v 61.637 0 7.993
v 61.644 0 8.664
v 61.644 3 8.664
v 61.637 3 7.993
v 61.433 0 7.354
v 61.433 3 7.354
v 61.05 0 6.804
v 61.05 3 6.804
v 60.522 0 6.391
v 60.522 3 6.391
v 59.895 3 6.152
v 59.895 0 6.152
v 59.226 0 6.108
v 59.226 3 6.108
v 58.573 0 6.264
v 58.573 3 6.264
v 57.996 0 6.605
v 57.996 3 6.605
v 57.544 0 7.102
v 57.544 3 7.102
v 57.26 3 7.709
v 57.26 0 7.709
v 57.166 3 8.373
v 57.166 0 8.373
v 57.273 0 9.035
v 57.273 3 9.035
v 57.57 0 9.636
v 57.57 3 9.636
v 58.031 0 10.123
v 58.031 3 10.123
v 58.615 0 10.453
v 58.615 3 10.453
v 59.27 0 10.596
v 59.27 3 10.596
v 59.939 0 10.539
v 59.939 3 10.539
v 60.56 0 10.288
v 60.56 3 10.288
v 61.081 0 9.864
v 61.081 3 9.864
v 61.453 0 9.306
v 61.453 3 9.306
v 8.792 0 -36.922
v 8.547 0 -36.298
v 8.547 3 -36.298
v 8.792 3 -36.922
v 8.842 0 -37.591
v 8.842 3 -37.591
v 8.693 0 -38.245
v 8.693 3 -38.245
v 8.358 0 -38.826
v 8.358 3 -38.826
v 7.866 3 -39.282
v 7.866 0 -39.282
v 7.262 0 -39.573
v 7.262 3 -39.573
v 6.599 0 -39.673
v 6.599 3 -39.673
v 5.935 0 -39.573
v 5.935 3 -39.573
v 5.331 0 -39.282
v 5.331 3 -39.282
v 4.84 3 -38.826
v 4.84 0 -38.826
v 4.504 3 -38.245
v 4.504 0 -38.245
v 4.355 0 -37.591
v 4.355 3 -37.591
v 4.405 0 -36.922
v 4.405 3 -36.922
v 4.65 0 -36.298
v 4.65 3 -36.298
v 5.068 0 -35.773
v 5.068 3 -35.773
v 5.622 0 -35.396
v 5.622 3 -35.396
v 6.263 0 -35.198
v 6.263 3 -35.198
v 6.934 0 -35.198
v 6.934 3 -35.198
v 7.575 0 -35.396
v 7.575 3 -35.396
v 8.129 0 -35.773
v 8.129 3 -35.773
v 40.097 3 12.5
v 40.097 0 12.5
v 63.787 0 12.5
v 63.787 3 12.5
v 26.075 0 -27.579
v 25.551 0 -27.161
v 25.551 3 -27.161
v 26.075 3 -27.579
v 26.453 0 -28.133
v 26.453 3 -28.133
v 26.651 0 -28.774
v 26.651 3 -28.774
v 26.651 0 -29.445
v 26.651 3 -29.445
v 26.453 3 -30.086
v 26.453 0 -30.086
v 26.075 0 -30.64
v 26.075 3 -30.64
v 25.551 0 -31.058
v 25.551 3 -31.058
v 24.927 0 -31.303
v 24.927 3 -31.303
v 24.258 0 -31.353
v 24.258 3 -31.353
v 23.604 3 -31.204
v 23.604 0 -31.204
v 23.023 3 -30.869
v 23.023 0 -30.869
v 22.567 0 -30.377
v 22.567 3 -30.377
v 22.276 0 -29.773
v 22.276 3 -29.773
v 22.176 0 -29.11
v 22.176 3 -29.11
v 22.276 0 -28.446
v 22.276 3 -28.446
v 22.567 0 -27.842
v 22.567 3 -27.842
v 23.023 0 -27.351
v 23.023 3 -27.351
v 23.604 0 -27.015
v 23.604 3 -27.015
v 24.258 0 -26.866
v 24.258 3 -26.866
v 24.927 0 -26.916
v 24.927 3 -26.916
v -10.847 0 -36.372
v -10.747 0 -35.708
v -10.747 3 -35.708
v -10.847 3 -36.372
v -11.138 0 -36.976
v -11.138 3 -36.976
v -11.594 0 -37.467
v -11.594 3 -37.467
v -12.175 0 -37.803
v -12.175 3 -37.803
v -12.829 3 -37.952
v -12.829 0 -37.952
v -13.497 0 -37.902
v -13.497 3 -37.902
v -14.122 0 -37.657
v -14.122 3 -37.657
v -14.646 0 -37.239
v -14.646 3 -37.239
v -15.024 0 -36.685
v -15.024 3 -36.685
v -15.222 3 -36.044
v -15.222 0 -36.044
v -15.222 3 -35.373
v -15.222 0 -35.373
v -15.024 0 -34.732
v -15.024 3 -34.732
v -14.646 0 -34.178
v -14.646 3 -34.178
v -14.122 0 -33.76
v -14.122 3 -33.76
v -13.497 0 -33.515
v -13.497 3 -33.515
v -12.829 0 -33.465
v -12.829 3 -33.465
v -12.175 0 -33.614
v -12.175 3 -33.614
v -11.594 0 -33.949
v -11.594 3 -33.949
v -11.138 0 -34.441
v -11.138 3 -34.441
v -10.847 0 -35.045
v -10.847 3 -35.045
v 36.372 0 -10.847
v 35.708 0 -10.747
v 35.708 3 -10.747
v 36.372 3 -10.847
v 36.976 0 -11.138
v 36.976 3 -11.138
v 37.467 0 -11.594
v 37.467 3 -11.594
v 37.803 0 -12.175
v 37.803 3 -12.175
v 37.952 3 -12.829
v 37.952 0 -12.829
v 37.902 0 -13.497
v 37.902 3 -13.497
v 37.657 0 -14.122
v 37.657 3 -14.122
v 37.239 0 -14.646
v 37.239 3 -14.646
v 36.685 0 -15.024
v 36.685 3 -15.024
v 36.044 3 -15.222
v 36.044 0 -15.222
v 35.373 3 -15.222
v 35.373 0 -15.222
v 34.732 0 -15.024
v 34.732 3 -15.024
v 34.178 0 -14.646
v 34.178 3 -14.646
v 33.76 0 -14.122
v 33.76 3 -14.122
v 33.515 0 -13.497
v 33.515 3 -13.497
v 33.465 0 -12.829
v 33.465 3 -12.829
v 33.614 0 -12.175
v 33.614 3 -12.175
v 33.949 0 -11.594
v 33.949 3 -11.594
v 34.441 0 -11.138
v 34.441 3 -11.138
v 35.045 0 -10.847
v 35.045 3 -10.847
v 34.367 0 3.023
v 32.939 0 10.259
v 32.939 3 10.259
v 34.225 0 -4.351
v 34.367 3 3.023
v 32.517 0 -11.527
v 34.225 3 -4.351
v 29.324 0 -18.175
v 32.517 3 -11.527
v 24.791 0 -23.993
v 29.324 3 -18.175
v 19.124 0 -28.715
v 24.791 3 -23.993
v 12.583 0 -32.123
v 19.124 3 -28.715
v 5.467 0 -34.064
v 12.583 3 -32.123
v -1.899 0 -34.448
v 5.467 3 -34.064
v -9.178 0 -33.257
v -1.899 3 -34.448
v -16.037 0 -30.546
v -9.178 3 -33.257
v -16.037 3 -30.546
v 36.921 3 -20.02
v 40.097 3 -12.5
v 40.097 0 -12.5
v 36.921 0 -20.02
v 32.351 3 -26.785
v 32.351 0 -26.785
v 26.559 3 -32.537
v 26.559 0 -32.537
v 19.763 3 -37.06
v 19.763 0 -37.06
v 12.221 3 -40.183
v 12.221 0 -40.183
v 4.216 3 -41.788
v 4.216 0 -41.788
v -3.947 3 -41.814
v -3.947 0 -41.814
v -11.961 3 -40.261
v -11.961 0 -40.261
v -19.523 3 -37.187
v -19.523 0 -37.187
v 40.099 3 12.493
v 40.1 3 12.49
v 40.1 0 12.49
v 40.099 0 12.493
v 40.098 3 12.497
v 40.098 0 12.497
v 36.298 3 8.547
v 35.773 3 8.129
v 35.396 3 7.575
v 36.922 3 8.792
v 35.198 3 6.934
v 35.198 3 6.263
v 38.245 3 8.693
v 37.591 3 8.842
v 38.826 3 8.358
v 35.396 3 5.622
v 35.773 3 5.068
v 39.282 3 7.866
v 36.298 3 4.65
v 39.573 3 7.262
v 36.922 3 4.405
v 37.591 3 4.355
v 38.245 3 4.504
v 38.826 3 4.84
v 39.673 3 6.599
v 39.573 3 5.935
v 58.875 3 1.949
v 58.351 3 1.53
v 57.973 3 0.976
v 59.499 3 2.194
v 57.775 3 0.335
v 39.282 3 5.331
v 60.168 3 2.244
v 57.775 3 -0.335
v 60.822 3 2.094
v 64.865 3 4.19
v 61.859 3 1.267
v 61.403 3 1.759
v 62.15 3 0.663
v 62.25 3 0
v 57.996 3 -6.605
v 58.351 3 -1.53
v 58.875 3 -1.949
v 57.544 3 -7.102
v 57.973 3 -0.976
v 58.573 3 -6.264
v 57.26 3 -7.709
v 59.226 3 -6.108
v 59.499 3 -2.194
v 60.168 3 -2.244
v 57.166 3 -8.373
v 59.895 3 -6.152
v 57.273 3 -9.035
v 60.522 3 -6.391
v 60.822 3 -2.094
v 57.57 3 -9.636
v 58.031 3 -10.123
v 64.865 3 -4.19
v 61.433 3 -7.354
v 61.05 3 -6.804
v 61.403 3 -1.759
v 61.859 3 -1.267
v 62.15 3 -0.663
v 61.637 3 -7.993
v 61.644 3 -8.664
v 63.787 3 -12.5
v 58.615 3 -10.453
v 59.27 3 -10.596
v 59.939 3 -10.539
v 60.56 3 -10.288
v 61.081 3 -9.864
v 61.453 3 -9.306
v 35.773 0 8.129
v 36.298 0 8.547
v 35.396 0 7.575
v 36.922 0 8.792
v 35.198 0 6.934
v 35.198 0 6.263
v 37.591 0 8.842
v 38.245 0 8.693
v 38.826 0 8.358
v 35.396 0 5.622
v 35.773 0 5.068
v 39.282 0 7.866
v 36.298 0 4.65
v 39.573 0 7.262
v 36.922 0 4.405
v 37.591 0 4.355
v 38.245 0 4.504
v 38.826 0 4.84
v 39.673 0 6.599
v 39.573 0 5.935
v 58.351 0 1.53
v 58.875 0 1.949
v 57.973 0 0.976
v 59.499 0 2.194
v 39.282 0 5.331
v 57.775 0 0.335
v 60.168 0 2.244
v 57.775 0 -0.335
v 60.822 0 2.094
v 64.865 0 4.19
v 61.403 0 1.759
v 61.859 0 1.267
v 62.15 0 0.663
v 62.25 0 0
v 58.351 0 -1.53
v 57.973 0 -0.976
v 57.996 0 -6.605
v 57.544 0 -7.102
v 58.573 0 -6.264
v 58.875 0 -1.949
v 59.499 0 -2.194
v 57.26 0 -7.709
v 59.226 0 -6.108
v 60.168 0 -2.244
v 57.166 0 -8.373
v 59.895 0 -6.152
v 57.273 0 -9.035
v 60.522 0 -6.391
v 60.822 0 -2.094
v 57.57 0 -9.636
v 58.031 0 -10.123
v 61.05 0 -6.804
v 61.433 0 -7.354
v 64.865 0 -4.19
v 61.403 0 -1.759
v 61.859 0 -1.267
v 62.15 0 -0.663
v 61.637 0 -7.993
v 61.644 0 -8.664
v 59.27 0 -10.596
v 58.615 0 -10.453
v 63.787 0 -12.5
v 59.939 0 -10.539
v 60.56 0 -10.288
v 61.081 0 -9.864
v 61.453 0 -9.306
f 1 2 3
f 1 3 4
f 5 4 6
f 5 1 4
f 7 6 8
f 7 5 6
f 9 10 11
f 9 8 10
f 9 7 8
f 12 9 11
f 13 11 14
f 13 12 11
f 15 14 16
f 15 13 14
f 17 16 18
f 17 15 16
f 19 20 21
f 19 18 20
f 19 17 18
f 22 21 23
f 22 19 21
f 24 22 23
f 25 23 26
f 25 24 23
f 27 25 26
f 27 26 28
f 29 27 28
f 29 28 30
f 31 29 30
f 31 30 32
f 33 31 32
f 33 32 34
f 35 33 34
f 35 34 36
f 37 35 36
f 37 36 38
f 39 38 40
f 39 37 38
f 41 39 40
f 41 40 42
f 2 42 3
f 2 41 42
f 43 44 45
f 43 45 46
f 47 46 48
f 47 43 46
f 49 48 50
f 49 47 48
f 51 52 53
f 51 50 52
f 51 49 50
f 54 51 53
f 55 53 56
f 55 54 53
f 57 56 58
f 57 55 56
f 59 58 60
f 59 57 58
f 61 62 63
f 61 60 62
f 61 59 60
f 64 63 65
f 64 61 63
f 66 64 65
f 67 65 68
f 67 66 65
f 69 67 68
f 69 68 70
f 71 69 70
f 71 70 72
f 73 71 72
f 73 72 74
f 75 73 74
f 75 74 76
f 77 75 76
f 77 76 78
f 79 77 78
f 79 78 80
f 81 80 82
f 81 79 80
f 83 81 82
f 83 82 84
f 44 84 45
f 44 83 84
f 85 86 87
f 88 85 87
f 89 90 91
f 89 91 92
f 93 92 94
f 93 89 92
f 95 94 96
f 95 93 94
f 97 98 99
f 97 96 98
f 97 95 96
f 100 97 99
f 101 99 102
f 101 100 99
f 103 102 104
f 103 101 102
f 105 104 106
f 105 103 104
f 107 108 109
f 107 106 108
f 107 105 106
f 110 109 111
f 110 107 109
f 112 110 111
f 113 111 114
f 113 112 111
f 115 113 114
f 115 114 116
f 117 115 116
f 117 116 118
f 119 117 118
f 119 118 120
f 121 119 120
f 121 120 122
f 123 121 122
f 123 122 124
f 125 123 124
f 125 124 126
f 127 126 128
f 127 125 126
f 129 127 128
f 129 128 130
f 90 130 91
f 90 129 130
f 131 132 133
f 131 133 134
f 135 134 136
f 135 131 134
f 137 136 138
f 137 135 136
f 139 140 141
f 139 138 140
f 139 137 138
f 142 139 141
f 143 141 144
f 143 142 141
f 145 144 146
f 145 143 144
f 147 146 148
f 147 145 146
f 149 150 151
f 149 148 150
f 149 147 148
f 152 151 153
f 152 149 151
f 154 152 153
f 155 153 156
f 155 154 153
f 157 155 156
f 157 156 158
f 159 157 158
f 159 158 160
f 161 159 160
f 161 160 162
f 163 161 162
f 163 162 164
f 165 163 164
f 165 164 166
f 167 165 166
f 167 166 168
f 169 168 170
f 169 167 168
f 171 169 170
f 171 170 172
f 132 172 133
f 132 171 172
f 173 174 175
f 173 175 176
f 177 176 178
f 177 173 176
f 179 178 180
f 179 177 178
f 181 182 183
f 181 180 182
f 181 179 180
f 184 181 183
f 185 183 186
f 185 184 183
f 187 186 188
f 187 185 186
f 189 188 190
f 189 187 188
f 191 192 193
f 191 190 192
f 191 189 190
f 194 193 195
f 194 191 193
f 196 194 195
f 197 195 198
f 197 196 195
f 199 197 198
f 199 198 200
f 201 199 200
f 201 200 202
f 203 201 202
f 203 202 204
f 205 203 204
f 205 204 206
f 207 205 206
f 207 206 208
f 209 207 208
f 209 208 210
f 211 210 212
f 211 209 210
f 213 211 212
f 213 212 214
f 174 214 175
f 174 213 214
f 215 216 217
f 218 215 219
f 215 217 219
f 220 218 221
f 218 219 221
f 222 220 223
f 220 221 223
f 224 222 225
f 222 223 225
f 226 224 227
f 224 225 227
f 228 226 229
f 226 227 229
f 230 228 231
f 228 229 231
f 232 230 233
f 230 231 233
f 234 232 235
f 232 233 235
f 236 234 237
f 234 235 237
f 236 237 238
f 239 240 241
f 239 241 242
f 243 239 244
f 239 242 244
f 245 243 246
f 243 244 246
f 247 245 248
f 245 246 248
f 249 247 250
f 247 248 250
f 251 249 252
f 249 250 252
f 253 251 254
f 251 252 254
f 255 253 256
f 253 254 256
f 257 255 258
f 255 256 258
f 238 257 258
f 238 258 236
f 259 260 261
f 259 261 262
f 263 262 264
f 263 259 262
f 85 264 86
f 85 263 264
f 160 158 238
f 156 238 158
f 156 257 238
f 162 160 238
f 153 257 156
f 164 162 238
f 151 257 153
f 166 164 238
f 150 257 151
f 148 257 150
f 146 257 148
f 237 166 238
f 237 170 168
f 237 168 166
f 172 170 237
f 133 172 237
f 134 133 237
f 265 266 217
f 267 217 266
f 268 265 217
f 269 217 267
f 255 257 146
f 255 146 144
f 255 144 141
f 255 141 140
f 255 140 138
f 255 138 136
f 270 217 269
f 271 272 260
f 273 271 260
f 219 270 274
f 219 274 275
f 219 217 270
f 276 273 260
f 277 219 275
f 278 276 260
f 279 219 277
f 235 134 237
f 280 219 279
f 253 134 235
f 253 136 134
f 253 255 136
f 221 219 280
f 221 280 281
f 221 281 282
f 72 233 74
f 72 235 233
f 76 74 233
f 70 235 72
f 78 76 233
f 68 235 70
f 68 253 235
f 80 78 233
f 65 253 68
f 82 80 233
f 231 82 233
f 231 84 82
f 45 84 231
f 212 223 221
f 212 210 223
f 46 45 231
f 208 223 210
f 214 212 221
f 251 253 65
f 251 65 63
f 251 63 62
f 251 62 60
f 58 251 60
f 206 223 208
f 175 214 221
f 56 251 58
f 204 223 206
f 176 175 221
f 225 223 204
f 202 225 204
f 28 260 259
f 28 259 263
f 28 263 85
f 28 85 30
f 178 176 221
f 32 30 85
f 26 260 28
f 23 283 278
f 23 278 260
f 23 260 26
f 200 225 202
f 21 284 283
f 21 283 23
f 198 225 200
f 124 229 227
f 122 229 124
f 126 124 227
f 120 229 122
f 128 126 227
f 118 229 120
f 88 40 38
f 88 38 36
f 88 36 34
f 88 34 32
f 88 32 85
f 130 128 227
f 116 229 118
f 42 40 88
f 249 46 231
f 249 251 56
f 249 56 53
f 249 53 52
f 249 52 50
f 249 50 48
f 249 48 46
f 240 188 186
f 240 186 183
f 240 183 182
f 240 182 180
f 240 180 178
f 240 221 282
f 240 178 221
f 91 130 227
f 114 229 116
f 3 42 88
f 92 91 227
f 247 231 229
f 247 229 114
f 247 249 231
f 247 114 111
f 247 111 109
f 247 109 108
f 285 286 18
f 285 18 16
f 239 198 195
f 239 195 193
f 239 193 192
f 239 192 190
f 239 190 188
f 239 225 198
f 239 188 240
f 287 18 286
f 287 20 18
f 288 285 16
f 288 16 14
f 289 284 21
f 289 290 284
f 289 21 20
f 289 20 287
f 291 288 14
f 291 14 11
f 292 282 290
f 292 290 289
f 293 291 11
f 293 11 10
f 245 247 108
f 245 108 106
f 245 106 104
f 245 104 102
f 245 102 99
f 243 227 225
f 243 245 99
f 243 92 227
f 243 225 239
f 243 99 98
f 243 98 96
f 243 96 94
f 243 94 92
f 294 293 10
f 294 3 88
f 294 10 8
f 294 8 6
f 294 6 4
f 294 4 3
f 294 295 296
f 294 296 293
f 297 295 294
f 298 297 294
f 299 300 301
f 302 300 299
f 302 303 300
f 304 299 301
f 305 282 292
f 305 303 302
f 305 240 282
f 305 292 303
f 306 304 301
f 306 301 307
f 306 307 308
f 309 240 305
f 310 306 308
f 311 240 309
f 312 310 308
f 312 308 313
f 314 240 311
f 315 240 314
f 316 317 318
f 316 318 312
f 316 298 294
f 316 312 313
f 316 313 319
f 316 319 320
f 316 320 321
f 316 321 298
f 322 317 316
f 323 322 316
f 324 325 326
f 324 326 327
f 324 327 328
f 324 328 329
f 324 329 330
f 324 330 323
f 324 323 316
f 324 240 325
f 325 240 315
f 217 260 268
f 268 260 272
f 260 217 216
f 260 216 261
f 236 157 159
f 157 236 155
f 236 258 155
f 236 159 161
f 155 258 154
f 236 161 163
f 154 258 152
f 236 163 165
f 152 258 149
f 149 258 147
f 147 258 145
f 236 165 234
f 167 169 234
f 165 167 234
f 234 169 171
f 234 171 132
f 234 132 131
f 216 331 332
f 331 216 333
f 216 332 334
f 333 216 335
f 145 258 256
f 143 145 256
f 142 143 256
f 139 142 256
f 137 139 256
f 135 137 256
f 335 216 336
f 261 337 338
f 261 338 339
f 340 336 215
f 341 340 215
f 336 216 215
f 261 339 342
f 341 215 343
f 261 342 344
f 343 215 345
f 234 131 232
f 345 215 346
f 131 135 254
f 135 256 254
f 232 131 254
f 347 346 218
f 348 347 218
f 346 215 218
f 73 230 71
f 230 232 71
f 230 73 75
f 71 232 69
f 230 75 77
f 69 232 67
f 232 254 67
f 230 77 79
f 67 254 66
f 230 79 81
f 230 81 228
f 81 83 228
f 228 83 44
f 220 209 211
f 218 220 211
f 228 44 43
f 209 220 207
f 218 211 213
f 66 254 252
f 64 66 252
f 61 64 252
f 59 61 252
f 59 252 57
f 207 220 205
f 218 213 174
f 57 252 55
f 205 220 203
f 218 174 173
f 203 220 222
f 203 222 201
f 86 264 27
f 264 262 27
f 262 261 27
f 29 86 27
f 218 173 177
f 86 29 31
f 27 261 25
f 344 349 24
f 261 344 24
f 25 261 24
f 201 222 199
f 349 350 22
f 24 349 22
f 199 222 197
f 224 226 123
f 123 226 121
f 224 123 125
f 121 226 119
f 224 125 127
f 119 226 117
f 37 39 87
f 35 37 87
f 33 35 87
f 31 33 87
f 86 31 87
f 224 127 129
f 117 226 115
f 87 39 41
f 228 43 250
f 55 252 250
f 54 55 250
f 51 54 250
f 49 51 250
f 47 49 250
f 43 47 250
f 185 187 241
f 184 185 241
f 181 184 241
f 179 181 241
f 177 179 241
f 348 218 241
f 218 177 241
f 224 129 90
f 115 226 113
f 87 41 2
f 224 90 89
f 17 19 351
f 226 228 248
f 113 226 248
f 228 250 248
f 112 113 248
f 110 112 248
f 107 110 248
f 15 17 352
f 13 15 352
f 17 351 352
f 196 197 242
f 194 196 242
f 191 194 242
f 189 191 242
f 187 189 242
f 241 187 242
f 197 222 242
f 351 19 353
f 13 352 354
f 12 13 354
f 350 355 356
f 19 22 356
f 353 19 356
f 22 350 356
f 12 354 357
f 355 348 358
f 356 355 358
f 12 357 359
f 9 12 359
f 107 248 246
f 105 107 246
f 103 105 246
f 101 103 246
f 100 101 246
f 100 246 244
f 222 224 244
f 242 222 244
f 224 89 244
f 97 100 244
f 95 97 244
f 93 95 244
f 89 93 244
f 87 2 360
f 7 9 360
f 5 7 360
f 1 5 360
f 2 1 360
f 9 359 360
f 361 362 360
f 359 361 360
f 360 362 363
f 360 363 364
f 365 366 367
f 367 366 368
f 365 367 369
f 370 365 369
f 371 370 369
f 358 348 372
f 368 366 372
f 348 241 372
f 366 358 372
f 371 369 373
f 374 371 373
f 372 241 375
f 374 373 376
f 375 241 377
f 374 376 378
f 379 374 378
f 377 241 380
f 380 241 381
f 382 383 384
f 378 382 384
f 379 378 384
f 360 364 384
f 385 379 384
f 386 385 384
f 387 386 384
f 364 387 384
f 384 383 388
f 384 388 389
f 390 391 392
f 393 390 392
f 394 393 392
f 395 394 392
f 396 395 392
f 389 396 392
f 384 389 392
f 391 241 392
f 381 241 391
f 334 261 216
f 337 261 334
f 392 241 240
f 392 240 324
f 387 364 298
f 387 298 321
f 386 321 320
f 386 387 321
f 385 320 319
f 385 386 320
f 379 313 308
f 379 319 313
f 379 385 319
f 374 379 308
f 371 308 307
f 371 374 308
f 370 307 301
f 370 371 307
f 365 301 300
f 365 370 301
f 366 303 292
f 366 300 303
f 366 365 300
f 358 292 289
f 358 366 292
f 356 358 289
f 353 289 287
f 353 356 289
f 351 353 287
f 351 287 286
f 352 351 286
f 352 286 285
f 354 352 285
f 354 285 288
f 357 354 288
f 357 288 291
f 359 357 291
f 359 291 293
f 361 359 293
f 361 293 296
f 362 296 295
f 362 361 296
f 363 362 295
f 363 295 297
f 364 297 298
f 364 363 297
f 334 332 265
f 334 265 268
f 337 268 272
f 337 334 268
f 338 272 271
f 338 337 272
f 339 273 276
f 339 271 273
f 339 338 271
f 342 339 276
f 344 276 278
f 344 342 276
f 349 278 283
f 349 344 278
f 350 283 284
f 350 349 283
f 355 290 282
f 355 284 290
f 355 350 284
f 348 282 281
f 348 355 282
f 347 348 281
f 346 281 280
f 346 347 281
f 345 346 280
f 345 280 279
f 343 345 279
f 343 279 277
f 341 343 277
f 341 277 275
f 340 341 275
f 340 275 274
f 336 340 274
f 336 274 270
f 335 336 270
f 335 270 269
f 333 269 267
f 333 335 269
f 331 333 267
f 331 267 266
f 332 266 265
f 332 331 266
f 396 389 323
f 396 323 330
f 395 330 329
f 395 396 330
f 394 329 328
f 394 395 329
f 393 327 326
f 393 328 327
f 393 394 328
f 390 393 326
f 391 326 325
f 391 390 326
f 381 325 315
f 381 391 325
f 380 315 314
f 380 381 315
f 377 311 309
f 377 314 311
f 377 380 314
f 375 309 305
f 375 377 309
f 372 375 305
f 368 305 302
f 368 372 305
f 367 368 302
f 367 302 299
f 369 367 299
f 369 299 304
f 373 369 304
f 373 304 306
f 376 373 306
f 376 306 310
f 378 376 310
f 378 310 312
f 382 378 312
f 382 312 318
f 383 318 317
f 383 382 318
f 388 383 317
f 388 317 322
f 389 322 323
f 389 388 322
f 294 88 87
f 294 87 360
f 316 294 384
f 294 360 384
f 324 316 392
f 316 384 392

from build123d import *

# Parameters (mm, degrees)
SKETCH1_R                       = 42
BOSS_EXTRUDE1_DEPTH             = 3
SKETCH2_W                       = 70
SKETCH2_H                       = 25
BOSS_EXTRUDE2_DEPTH             = 3
SKETCH3_R                       = 34.5
CUT_EXTRUDE1_DEPTH              = 1
CUT_EXTRUDE1_DEPTH_BACK         = 4
CUT_EXTRUDE2_DEPTH              = 1
CUT_EXTRUDE2_DEPTH_BACK         = 4
CUT_EXTRUDE3_START              = -4
SKETCH5_R                       = 2.25
CUT_EXTRUDE3_DEPTH              = 5
CIRPATTERN1_COUNT               = 12
SKETCH6_R                       = 122.183782822
SKETCH6_R_2                     = 65
CUT_EXTRUDE4_DEPTH              = 4
CUT_EXTRUDE4_DEPTH_BACK         = 1
CUT_EXTRUDE5_START              = -4
SKETCH7_R                       = 2.25
CUT_EXTRUDE5_DEPTH              = 5
CIRPATTERN2_COUNT               = 2
CIRPATTERN2_ANGLE               = 8
CIRPATTERN2_THE_OTHER_WAY_COUNT = 2
CIRPATTERN2_THE_OTHER_WAY_ANGLE = 8


with BuildPart() as part:
    # Sketch1 → Boss-Extrude1 (new body)
    with BuildSketch(Plane(origin=(0, 0, 0), x_dir=(1, 0, 0), z_dir=(0, 1, 0))):
        Circle(SKETCH1_R)
    extrude(amount=BOSS_EXTRUDE1_DEPTH)

    # Sketch2 → Boss-Extrude2 (add)
    with BuildSketch(Plane(origin=(0, 0, 0), x_dir=(1, 0, 0), z_dir=(0, 1, 0))):
        with Locations((35, 0)):
            Rectangle(SKETCH2_W, SKETCH2_H)
    extrude(amount=BOSS_EXTRUDE2_DEPTH)

    # Sketch3 → Cut-Extrude1 (cut, two sides)
    with BuildSketch(Plane(origin=(0, 3, 0), x_dir=(1, 0, 0), z_dir=(0, 1, 0))) as cut_extrude1_sk:
        Circle(SKETCH3_R)
    extrude(amount=CUT_EXTRUDE1_DEPTH, mode=Mode.SUBTRACT)
    extrude(cut_extrude1_sk.sketch, amount=-CUT_EXTRUDE1_DEPTH_BACK, mode=Mode.SUBTRACT)

    # Sketch4 → Cut-Extrude2 (cut, two sides)
    with BuildSketch(Plane(origin=(0, 3, 0), x_dir=(1, 0, 0), z_dir=(0, 1, 0))) as cut_extrude2_sk:
        with BuildLine():
            Line((0, 0), (40.099953579, -12.489744711))
            ThreePointArc((40.099953579, -12.489744711), (-26.884607378, -32.267907991), (-19.52336592, 37.186532282))
            Line((-19.52336592, 37.186532282), (0, 0))
        make_face()
    extrude(amount=CUT_EXTRUDE2_DEPTH, mode=Mode.SUBTRACT)
    extrude(cut_extrude2_sk.sketch, amount=-CUT_EXTRUDE2_DEPTH_BACK, mode=Mode.SUBTRACT)

    # Sketch5 → Cut-Extrude3 (cut)
    with BuildSketch(Plane(origin=(0, 3, 0), x_dir=(1, 0, 0), z_dir=(0, 1, 0)).offset(CUT_EXTRUDE3_START)):
        with Locations((-12.996765446, 35.70831959)):
            Circle(SKETCH5_R)
    cut_extrude3 = extrude(amount=CUT_EXTRUDE3_DEPTH, mode=Mode.SUBTRACT)

    # CirPattern1: Cut-Extrude3 ×12 about axis
    cirpattern1_axis = Axis((0, 0, 0), (0, -1, 0))
    for i in range(1, CIRPATTERN1_COUNT):
        add(cut_extrude3.rotate(cirpattern1_axis, i * 360 / CIRPATTERN1_COUNT), mode=Mode.SUBTRACT)

    # Sketch6 → Cut-Extrude4 (cut, two sides)
    with BuildSketch(Plane(origin=(0, 0, 0), x_dir=(1, 0, 0), z_dir=(0, 1, 0))) as cut_extrude4_sk:
        Circle(SKETCH6_R)
        Circle(SKETCH6_R_2, mode=Mode.SUBTRACT)
    extrude(amount=CUT_EXTRUDE4_DEPTH, mode=Mode.SUBTRACT)
    extrude(cut_extrude4_sk.sketch, amount=-CUT_EXTRUDE4_DEPTH_BACK, mode=Mode.SUBTRACT)

    # Sketch7 → Cut-Extrude5 (cut)
    with BuildSketch(Plane(origin=(0, 3, 0), x_dir=(1, 0, 0), z_dir=(0, 1, 0)).offset(CUT_EXTRUDE5_START)):
        with Locations((60, 0)):
            Circle(SKETCH7_R)
    cut_extrude5 = extrude(amount=CUT_EXTRUDE5_DEPTH, mode=Mode.SUBTRACT)

    # CirPattern2: Cut-Extrude5 ×2 about axis
    cirpattern2_axis = Axis((0, 3, 0), (0, 1, 0))
    for i in range(1, CIRPATTERN2_COUNT):
        add(cut_extrude5.rotate(cirpattern2_axis, i * CIRPATTERN2_ANGLE / (CIRPATTERN2_COUNT - 1)), mode=Mode.SUBTRACT)

    # CirPattern2 the other way: Cut-Extrude5 ×2 about axis
    cirpattern2_the_other_way_axis = Axis((0, 3, 0), (0, -1, 0))
    for i in range(1, CIRPATTERN2_THE_OTHER_WAY_COUNT):
        add(cut_extrude5.rotate(cirpattern2_the_other_way_axis, i * CIRPATTERN2_THE_OTHER_WAY_ANGLE / (CIRPATTERN2_THE_OTHER_WAY_COUNT - 1)), mode=Mode.SUBTRACT)


solid = part.part
